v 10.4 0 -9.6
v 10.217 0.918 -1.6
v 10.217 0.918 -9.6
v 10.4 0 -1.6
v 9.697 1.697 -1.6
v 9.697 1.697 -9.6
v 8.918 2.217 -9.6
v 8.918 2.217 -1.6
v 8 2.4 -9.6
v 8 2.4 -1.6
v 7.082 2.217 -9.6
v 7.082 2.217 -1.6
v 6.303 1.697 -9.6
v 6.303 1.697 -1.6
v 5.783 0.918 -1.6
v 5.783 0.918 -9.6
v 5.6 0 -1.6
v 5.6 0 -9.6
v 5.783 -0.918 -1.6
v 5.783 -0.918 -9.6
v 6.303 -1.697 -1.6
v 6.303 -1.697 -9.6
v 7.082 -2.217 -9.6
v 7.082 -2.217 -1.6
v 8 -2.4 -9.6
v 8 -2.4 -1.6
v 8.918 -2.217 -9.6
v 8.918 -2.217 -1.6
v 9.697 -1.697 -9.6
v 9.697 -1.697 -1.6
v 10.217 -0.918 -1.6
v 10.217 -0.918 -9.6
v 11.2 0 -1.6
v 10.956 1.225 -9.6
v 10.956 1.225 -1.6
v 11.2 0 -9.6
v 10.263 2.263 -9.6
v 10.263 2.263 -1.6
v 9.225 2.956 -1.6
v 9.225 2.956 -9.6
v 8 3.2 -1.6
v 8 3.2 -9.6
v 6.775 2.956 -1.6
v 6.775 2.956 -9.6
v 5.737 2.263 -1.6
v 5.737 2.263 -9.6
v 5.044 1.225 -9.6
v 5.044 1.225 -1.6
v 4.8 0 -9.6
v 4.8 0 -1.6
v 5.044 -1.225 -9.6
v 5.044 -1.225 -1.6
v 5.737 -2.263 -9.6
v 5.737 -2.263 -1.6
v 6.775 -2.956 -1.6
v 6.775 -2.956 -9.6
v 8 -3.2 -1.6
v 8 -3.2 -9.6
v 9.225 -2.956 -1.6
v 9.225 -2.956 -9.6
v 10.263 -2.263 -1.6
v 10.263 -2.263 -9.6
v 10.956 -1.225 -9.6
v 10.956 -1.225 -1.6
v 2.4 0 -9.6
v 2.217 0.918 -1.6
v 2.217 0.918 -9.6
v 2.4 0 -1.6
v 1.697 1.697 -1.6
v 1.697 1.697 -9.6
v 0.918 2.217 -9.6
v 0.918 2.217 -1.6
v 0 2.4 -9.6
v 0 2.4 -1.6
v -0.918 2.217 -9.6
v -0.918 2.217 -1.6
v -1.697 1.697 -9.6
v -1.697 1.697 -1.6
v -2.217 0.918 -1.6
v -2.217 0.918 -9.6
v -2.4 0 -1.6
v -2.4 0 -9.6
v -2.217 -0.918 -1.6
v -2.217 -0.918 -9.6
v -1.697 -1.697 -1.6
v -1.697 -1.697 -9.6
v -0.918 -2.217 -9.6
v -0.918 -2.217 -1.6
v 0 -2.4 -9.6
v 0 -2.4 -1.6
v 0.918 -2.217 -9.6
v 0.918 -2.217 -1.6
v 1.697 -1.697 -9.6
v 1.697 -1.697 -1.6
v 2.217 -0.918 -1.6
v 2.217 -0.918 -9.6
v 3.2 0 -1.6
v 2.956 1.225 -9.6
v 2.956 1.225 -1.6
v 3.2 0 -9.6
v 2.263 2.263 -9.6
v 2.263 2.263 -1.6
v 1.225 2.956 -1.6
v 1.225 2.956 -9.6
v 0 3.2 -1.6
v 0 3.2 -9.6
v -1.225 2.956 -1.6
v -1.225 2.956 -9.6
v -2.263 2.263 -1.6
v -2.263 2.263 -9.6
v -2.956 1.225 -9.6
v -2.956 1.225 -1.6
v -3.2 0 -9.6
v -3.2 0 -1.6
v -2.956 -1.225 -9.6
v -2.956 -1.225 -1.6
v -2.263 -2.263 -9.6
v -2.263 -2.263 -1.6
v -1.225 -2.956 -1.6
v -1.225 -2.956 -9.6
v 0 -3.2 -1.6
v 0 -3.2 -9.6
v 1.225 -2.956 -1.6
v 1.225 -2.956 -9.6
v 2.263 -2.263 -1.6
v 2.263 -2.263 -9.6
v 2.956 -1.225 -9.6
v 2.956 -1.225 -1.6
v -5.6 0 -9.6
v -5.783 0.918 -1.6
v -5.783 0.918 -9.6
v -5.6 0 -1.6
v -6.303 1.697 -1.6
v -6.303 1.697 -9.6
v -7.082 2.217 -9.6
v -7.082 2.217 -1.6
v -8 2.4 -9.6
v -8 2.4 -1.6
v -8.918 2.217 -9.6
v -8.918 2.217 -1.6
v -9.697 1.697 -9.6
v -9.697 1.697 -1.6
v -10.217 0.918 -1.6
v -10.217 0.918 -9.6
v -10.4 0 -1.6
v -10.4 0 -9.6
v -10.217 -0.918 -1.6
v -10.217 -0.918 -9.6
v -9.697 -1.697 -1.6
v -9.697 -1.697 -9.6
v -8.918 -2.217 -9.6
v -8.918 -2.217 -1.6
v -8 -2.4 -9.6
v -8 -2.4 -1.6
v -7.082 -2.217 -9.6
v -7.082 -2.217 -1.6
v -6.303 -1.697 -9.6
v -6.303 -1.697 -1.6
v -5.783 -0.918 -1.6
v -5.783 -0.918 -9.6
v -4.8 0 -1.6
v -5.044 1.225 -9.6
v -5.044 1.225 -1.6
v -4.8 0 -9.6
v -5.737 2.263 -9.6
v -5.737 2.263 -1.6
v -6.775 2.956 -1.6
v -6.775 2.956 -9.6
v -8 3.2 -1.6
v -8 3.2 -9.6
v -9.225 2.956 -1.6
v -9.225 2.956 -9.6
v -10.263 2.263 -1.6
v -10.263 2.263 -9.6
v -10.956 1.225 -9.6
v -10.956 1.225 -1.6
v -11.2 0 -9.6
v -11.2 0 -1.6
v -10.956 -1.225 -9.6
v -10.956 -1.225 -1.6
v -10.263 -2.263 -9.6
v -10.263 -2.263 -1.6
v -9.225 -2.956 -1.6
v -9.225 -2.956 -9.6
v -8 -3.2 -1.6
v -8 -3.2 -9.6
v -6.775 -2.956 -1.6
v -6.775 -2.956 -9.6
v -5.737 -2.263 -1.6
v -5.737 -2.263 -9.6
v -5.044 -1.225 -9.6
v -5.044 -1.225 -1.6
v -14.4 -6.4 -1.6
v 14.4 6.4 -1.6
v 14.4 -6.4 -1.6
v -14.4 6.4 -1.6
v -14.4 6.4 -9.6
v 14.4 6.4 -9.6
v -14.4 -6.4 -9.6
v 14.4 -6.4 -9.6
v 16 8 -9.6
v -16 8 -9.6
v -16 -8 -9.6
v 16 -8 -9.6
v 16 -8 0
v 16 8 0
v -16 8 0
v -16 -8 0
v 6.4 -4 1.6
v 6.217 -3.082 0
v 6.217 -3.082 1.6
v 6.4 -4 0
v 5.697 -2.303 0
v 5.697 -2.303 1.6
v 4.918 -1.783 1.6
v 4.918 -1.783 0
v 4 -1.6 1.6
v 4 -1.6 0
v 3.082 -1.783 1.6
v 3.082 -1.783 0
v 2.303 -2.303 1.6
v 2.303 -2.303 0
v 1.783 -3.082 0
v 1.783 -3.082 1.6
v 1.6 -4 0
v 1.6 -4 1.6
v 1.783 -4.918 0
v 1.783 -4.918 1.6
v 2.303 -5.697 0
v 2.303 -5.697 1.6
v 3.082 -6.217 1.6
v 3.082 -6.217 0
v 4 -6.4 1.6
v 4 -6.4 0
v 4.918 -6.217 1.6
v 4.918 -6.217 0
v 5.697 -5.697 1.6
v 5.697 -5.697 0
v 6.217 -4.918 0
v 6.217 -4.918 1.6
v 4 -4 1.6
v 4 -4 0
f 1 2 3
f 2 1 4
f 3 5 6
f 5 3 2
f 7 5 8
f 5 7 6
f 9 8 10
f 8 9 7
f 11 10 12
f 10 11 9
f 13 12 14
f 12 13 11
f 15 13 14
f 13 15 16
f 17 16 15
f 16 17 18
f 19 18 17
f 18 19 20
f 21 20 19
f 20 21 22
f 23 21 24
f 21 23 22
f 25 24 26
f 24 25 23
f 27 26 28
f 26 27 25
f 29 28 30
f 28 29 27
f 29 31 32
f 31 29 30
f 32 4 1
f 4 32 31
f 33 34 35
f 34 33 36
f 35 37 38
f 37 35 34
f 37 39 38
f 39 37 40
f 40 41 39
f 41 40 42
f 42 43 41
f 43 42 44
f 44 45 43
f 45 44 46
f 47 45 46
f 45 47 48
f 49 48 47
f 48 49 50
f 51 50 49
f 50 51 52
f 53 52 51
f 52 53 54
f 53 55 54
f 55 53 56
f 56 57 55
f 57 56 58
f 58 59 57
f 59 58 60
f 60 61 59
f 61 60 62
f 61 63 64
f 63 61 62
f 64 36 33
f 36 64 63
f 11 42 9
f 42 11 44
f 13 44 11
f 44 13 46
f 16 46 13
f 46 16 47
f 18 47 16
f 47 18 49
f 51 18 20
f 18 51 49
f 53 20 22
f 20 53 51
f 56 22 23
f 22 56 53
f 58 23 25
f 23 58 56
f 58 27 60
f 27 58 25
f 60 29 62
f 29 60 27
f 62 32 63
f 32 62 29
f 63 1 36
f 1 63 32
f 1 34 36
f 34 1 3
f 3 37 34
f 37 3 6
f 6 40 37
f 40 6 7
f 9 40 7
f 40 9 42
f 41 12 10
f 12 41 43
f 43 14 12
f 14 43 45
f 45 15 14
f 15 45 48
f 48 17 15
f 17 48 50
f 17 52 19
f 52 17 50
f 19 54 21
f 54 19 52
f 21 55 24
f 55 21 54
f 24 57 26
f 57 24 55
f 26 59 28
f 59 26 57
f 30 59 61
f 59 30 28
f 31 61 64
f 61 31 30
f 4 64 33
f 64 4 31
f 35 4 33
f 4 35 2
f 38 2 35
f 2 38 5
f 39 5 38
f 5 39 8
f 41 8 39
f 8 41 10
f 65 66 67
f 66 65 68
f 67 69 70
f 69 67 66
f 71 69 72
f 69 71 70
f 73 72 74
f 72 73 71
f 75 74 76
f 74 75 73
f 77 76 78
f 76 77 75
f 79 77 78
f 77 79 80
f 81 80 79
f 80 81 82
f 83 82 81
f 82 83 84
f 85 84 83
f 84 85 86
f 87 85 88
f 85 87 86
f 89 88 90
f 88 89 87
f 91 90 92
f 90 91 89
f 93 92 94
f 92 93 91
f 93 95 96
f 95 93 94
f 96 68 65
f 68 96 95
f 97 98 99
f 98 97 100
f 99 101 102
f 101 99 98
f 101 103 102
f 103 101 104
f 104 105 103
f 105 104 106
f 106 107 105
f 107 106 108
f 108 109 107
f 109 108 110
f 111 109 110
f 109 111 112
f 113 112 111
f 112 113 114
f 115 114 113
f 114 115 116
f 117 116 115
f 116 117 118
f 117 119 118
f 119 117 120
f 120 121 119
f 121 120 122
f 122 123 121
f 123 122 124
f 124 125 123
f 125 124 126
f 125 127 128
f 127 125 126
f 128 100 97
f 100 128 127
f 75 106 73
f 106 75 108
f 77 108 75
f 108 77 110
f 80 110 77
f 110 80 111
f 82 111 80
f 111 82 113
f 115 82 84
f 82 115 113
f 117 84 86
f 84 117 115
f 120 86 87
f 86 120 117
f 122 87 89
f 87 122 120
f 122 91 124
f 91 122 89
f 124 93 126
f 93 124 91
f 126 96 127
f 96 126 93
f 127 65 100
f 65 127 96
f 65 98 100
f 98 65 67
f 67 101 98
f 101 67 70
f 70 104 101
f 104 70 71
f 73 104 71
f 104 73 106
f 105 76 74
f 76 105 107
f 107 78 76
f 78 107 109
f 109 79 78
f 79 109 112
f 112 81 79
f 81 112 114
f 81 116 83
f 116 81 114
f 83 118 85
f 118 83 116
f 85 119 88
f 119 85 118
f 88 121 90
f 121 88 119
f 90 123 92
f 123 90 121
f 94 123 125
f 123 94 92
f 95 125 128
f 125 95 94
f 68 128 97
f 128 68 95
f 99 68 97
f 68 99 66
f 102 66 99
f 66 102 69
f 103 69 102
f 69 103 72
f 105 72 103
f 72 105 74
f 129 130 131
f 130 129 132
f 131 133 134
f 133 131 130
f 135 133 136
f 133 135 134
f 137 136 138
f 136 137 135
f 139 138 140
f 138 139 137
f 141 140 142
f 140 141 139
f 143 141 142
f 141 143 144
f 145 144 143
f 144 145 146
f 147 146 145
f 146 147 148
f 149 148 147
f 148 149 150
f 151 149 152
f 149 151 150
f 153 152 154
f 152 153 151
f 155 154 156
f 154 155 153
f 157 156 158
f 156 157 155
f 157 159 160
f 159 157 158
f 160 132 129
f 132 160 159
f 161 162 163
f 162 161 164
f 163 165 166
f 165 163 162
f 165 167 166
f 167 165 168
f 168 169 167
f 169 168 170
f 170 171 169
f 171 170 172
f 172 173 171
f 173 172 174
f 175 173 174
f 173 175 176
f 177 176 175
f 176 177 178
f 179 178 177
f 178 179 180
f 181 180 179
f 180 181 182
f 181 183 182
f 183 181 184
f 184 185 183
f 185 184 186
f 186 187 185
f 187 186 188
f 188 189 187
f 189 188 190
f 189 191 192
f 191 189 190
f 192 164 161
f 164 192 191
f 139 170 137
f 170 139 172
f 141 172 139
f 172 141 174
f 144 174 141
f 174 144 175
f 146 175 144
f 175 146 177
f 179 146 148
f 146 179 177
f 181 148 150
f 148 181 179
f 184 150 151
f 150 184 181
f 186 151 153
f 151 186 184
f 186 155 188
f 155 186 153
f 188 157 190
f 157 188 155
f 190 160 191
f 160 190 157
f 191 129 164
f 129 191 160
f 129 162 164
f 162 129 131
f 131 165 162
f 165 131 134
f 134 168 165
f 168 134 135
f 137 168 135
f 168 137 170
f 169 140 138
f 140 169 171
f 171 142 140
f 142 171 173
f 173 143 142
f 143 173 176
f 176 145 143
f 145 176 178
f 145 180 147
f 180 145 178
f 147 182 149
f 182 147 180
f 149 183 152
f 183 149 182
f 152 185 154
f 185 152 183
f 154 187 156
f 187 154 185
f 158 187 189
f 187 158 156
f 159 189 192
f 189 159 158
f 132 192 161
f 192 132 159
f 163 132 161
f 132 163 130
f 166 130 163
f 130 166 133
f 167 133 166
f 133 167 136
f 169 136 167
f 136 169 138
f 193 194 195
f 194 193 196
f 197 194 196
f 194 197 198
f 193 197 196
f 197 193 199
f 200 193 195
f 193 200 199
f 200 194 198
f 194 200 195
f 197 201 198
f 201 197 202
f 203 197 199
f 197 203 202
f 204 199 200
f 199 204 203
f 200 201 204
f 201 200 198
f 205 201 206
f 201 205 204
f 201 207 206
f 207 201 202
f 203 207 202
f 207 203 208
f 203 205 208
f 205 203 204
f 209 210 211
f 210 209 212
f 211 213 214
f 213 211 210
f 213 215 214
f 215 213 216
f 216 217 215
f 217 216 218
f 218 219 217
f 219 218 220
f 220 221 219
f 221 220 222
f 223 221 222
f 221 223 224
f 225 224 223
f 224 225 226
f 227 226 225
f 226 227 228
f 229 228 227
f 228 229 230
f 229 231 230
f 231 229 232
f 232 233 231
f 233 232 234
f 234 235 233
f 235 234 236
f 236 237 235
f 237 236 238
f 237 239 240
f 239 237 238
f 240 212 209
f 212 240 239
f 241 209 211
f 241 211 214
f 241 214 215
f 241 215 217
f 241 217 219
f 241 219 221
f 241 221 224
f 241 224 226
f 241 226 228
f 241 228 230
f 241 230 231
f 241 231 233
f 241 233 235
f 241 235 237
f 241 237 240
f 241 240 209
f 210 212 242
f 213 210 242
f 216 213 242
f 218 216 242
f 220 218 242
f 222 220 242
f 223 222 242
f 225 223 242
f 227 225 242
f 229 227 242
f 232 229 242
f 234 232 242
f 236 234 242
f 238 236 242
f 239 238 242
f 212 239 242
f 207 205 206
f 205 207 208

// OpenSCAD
// file: ../p/4-4ring3.scad
use <../lib.scad>
$fa=1; $fs=0.2;
function ldraw_lib__4_4ring3(realsolid=false) = [
// 0 Ring  3 x 1.0
// 0 Name: 4-4ring3.dat
// 0 Author: James Jessiman
// 0 !LDRAW_ORG Primitive UPDATE 2009-01
// 0 !LICENSE Licensed under CC BY 2.0 and CC BY 4.0 : see CAreadme.txt
// 
// 0 BFC CERTIFY CCW
  [0,"BFC","CERTIFY"],
  [0,"BFC","CCW"],
// 
// 0 !HISTORY 1998-12-15 [PTadmin] Official Update 1998-10
// 0 !HISTORY 2002-04-05 [hafhead] Added BFC statement
// 0 !HISTORY 2002-04-25 [PTadmin] Official Update 2002-02
// 0 !HISTORY 2007-06-24 [PTadmin] Header formatted for Contributor Agreement
// 0 !HISTORY 2008-07-01 [PTadmin] Official Update 2008-01
// 0 !HISTORY 2008-08-26 [cwdee] Switch polygon winding and rename
// 0 !HISTORY 2009-05-02 [PTadmin] Official Update 2009-01
// 
// 
// 4 16 -1.5308 0 3.6956 -1.1481 0 2.7717 0 0 3 0 0 4
  [4,16,-1.5308,0,3.6956,-1.1481,0,2.7717,0,0,3,0,0,4],
// 4 16 -2.8284 0 2.8284 -2.1213 0 2.1213 -1.1481 0 2.7717 -1.5308 0 3.6956
  [4,16,-2.8284,0,2.8284,-2.1213,0,2.1213,-1.1481,0,2.7717,-1.5308,0,3.6956],
// 4 16 -3.6956 0 1.5308 -2.7717 0 1.1481 -2.1213 0 2.1213 -2.8284 0 2.8284
  [4,16,-3.6956,0,1.5308,-2.7717,0,1.1481,-2.1213,0,2.1213,-2.8284,0,2.8284],
// 4 16 -4 0 0 -3 0 0 -2.7717 0 1.1481 -3.6956 0 1.5308
  [4,16,-4,0,0,-3,0,0,-2.7717,0,1.1481,-3.6956,0,1.5308],
// 4 16 -3.6956 0 -1.5308 -2.7717 0 -1.1481 -3 0 0 -4 0 0
  [4,16,-3.6956,0,-1.5308,-2.7717,0,-1.1481,-3,0,0,-4,0,0],
// 4 16 -2.8284 0 -2.8284 -2.1213 0 -2.1213 -2.7717 0 -1.1481 -3.6956 0 -1.5308
  [4,16,-2.8284,0,-2.8284,-2.1213,0,-2.1213,-2.7717,0,-1.1481,-3.6956,0,-1.5308],
// 4 16 -1.5308 0 -3.6956 -1.1481 0 -2.7717 -2.1213 0 -2.1213 -2.8284 0 -2.8284
  [4,16,-1.5308,0,-3.6956,-1.1481,0,-2.7717,-2.1213,0,-2.1213,-2.8284,0,-2.8284],
// 4 16 0 0 -4 0 0 -3 -1.1481 0 -2.7717 -1.5308 0 -3.6956
  [4,16,0,0,-4,0,0,-3,-1.1481,0,-2.7717,-1.5308,0,-3.6956],
// 4 16 1.5308 0 -3.6956 1.1481 0 -2.7717 0 0 -3 0 0 -4
  [4,16,1.5308,0,-3.6956,1.1481,0,-2.7717,0,0,-3,0,0,-4],
// 4 16 2.8284 0 -2.8284 2.1213 0 -2.1213 1.1481 0 -2.7717 1.5308 0 -3.6956
  [4,16,2.8284,0,-2.8284,2.1213,0,-2.1213,1.1481,0,-2.7717,1.5308,0,-3.6956],
// 4 16 3.6956 0 -1.5308 2.7717 0 -1.1481 2.1213 0 -2.1213 2.8284 0 -2.8284
  [4,16,3.6956,0,-1.5308,2.7717,0,-1.1481,2.1213,0,-2.1213,2.8284,0,-2.8284],
// 4 16 4 0 0 3 0 0 2.7717 0 -1.1481 3.6956 0 -1.5308
  [4,16,4,0,0,3,0,0,2.7717,0,-1.1481,3.6956,0,-1.5308],
// 4 16 3.6956 0 1.5308 2.7717 0 1.1481 3 0 0 4 0 0
  [4,16,3.6956,0,1.5308,2.7717,0,1.1481,3,0,0,4,0,0],
// 4 16 2.8284 0 2.8284 2.1213 0 2.1213 2.7717 0 1.1481 3.6956 0 1.5308
  [4,16,2.8284,0,2.8284,2.1213,0,2.1213,2.7717,0,1.1481,3.6956,0,1.5308],
// 4 16 1.5308 0 3.6956 1.1481 0 2.7717 2.1213 0 2.1213 2.8284 0 2.8284
  [4,16,1.5308,0,3.6956,1.1481,0,2.7717,2.1213,0,2.1213,2.8284,0,2.8284],
// 4 16 0 0 4 0 0 3 1.1481 0 2.7717 1.5308 0 3.6956
  [4,16,0,0,4,0,0,3,1.1481,0,2.7717,1.5308,0,3.6956],
// 0
];
module ldraw_lib__4_4ring3(step=0, col=false, unit=2/5, alt=false, line=0.2, solid=!$preview)
    makepoly(ldraw_lib__4_4ring3(solid), step=step, col=col, unit=unit, alt=alt, line=line, solid=solid);
ldraw_lib__4_4ring3(line=0.2);
// file: ../p/4-4edge.scad
use <../lib.scad>
function ldraw_lib__4_4edge() = [
// 0 Circle 1.0
// 0 Name: 4-4edge.dat
// 0 Author: James Jessiman
// 0 !LDRAW_ORG Primitive UPDATE 2017-01
// 0 !LICENSE Licensed under CC BY 2.0 and CC BY 4.0 : see CAreadme.txt
// 
// 0 BFC CERTIFY CCW
  [0,"BFC","CERTIFY"],
  [0,"BFC","CCW"],
// 
// 0 !HISTORY 1998-12-15 [PTadmin] Official Update 1998-10
// 0 !HISTORY 2005-12-28 [PTadmin] Official Update 2005-01
// 0 !HISTORY 2007-06-24 [PTadmin] Header formatted for Contributor Agreement
// 0 !HISTORY 2008-07-01 [PTadmin] Official Update 2008-01
// 0 !HISTORY 2017-01-15 [Steffen] BFCed
// 0 !HISTORY 2017-12-30 [PTadmin] Official Update 2017-01
// 
// 
// 2 24 1 0 0 0.9239 0 0.3827
  [2,24,1,0,0,0.9239,0,0.3827],
// 2 24 0.9239 0 0.3827 0.7071 0 0.7071
  [2,24,0.9239,0,0.3827,0.7071,0,0.7071],
// 2 24 0.7071 0 0.7071 0.3827 0 0.9239
  [2,24,0.7071,0,0.7071,0.3827,0,0.9239],
// 2 24 0.3827 0 0.9239 0 0 1
  [2,24,0.3827,0,0.9239,0,0,1],
// 2 24 0 0 1 -0.3827 0 0.9239
  [2,24,0,0,1,-0.3827,0,0.9239],
// 2 24 -0.3827 0 0.9239 -0.7071 0 0.7071
  [2,24,-0.3827,0,0.9239,-0.7071,0,0.7071],
// 2 24 -0.7071 0 0.7071 -0.9239 0 0.3827
  [2,24,-0.7071,0,0.7071,-0.9239,0,0.3827],
// 2 24 -0.9239 0 0.3827 -1 0 -0
  [2,24,-0.9239,0,0.3827,-1,0,-0],
// 2 24 -1 0 -0 -0.9239 0 -0.3827
  [2,24,-1,0,-0,-0.9239,0,-0.3827],
// 2 24 -0.9239 0 -0.3827 -0.7071 0 -0.7071
  [2,24,-0.9239,0,-0.3827,-0.7071,0,-0.7071],
// 2 24 -0.7071 0 -0.7071 -0.3827 0 -0.9239
  [2,24,-0.7071,0,-0.7071,-0.3827,0,-0.9239],
// 2 24 -0.3827 0 -0.9239 0 0 -1
  [2,24,-0.3827,0,-0.9239,0,0,-1],
// 2 24 0 0 -1 0.3827 0 -0.9239
  [2,24,0,0,-1,0.3827,0,-0.9239],
// 2 24 0.3827 0 -0.9239 0.7071 0 -0.7071
  [2,24,0.3827,0,-0.9239,0.7071,0,-0.7071],
// 2 24 0.7071 0 -0.7071 0.9239 0 -0.3827
  [2,24,0.7071,0,-0.7071,0.9239,0,-0.3827],
// 2 24 0.9239 0 -0.3827 1 0 0
  [2,24,0.9239,0,-0.3827,1,0,0],
];
module ldraw_lib__4_4edge(step=0, col=false, unit=2/5, alt=false, line=0.2, solid=!$preview)
    makepoly(ldraw_lib__4_4edge(), step=step, col=col, unit=unit, alt=alt, line=line, solid=solid);
ldraw_lib__4_4edge(line=0.2);
// file: ../p/4-4disc.scad
use <../lib.scad>
function ldraw_lib__4_4disc() = [
// 0 Disc 1.0
// 0 Name: 4-4disc.dat
// 0 Author: James Jessiman
// 0 !LDRAW_ORG Primitive UPDATE 2002-02
// 0 !LICENSE Licensed under CC BY 2.0 and CC BY 4.0 : see CAreadme.txt
// 
// 0 BFC CERTIFY CCW
  [0,"BFC","CERTIFY"],
  [0,"BFC","CCW"],
// 
// 0 !HISTORY 1998-12-15 [PTadmin] Official Update 1998-10
// 0 !HISTORY 2002-03-23 [sbliss] Added BFC statement
// 0 !HISTORY 2002-04-25 [PTadmin] Official Update 2002-02
// 0 !HISTORY 2007-06-24 [PTadmin] Header formatted for Contributor Agreement
// 0 !HISTORY 2008-07-01 [PTadmin] Official Update 2008-01
// 
// 
// 3 16 0 0 0 1 0 0 0.9239 0 0.3827
  [3,16,0,0,0,1,0,0,0.9239,0,0.3827],
// 3 16 0 0 0 0.9239 0 0.3827 0.7071 0 0.7071
  [3,16,0,0,0,0.9239,0,0.3827,0.7071,0,0.7071],
// 3 16 0 0 0 0.7071 0 0.7071 0.3827 0 0.9239
  [3,16,0,0,0,0.7071,0,0.7071,0.3827,0,0.9239],
// 3 16 0 0 0 0.3827 0 0.9239 0 0 1
  [3,16,0,0,0,0.3827,0,0.9239,0,0,1],
// 3 16 0 0 0 0 0 1 -0.3827 0 0.9239
  [3,16,0,0,0,0,0,1,-0.3827,0,0.9239],
// 3 16 0 0 0 -0.3827 0 0.9239 -0.7071 0 0.7071
  [3,16,0,0,0,-0.3827,0,0.9239,-0.7071,0,0.7071],
// 3 16 0 0 0 -0.7071 0 0.7071 -0.9239 0 0.3827
  [3,16,0,0,0,-0.7071,0,0.7071,-0.9239,0,0.3827],
// 3 16 0 0 0 -0.9239 0 0.3827 -1 0 -0
  [3,16,0,0,0,-0.9239,0,0.3827,-1,0,-0],
// 3 16 0 0 0 -1 0 -0 -0.9239 0 -0.3827
  [3,16,0,0,0,-1,0,-0,-0.9239,0,-0.3827],
// 3 16 0 0 0 -0.9239 0 -0.3827 -0.7071 0 -0.7071
  [3,16,0,0,0,-0.9239,0,-0.3827,-0.7071,0,-0.7071],
// 3 16 0 0 0 -0.7071 0 -0.7071 -0.3827 0 -0.9239
  [3,16,0,0,0,-0.7071,0,-0.7071,-0.3827,0,-0.9239],
// 3 16 0 0 0 -0.3827 0 -0.9239 0 0 -1
  [3,16,0,0,0,-0.3827,0,-0.9239,0,0,-1],
// 3 16 0 0 0 0 0 -1 0.3827 0 -0.9239
  [3,16,0,0,0,0,0,-1,0.3827,0,-0.9239],
// 3 16 0 0 0 0.3827 0 -0.9239 0.7071 0 -0.7071
  [3,16,0,0,0,0.3827,0,-0.9239,0.7071,0,-0.7071],
// 3 16 0 0 0 0.7071 0 -0.7071 0.9239 0 -0.3827
  [3,16,0,0,0,0.7071,0,-0.7071,0.9239,0,-0.3827],
// 3 16 0 0 0 0.9239 0 -0.3827 1 0 0
  [3,16,0,0,0,0.9239,0,-0.3827,1,0,0],
// 0
];
module ldraw_lib__4_4disc(step=0, col=false, unit=2/5, alt=false, line=0.2, solid=!$preview)
    makepoly(ldraw_lib__4_4disc(), step=step, col=col, unit=unit, alt=alt, line=line, solid=solid);
ldraw_lib__4_4disc(line=0.2);
// file: ../p/4-4cyli.scad
use <../lib.scad>
$fa=1; $fs=0.2;
function ldraw_lib__4_4cyli(realsolid=false) = [
// 0 Cylinder 1.0
// 0 Name: 4-4cyli.dat
// 0 Author: James Jessiman
// 0 !LDRAW_ORG Primitive UPDATE 2005-01
// 0 !LICENSE Licensed under CC BY 2.0 and CC BY 4.0 : see CAreadme.txt
// 
// 0 BFC CERTIFY CCW
  [0,"BFC","CERTIFY"],
  [0,"BFC","CCW"],
// 
// 0 !HISTORY 1998-12-15 [PTadmin] Official Update 1998-10
// 0 !HISTORY 2002-03-23 [sbliss] Added BFC statement; merged headers from files in distributions LDraw 0.27 and Complete.
// 0 !HISTORY 2002-04-25 [PTadmin] Official Update 2002-02
// 0 !HISTORY 2004-12-14 [guyvivan] BFC CCW
// 0 !HISTORY 2005-12-28 [PTadmin] Official Update 2005-01
// 0 !HISTORY 2007-06-24 [PTadmin] Header formatted for Contributor Agreement
// 0 !HISTORY 2008-07-01 [PTadmin] Official Update 2008-01
// 
// 
// 4 16 1 1 0 0.9239 1 0.3827 0.9239 0 0.3827 1 0 0
  [4,16,1,1,0,0.9239,1,0.3827,0.9239,0,0.3827,1,0,0],
// 5 24 1 0 0 1 1 0 0.9239 0 0.3827 0.9239 0 -0.3827
  [5,24,1,0,0,1,1,0,0.9239,0,0.3827,0.9239,0,-0.3827],
// 4 16 0.9239 1 0.3827 0.7071 1 0.7071 0.7071 0 0.7071 0.9239 0 0.3827
  [4,16,0.9239,1,0.3827,0.7071,1,0.7071,0.7071,0,0.7071,0.9239,0,0.3827],
// 5 24 0.9239 0 0.3827 0.9239 1 0.3827 0.7071 0 0.7071 1 0 0
  [5,24,0.9239,0,0.3827,0.9239,1,0.3827,0.7071,0,0.7071,1,0,0],
// 4 16 0.7071 1 0.7071 0.3827 1 0.9239 0.3827 0 0.9239 0.7071 0 0.7071
  [4,16,0.7071,1,0.7071,0.3827,1,0.9239,0.3827,0,0.9239,0.7071,0,0.7071],
// 5 24 0.7071 0 0.7071 0.7071 1 0.7071 0.3827 0 0.9239 0.9239 0 0.3827
  [5,24,0.7071,0,0.7071,0.7071,1,0.7071,0.3827,0,0.9239,0.9239,0,0.3827],
// 4 16 0.3827 1 0.9239 0 1 1 0 0 1 0.3827 0 0.9239
  [4,16,0.3827,1,0.9239,0,1,1,0,0,1,0.3827,0,0.9239],
// 5 24 0.3827 0 0.9239 0.3827 1 0.9239 0 0 1 0.7071 0 0.7071
  [5,24,0.3827,0,0.9239,0.3827,1,0.9239,0,0,1,0.7071,0,0.7071],
// 4 16 0 1 1 -0.3827 1 0.9239 -0.3827 0 0.9239 0 0 1
  [4,16,0,1,1,-0.3827,1,0.9239,-0.3827,0,0.9239,0,0,1],
// 5 24 0 0 1 0 1 1 -0.3827 0 0.9239 0.3827 0 0.9239
  [5,24,0,0,1,0,1,1,-0.3827,0,0.9239,0.3827,0,0.9239],
// 4 16 -0.3827 1 0.9239 -0.7071 1 0.7071 -0.7071 0 0.7071 -0.3827 0 0.9239
  [4,16,-0.3827,1,0.9239,-0.7071,1,0.7071,-0.7071,0,0.7071,-0.3827,0,0.9239],
// 5 24 -0.3827 0 0.9239 -0.3827 1 0.9239 -0.7071 0 0.7071 0 0 1
  [5,24,-0.3827,0,0.9239,-0.3827,1,0.9239,-0.7071,0,0.7071,0,0,1],
// 4 16 -0.7071 1 0.7071 -0.9239 1 0.3827 -0.9239 0 0.3827 -0.7071 0 0.7071
  [4,16,-0.7071,1,0.7071,-0.9239,1,0.3827,-0.9239,0,0.3827,-0.7071,0,0.7071],
// 5 24 -0.7071 0 0.7071 -0.7071 1 0.7071 -0.9239 0 0.3827 -0.3827 0 0.9239
  [5,24,-0.7071,0,0.7071,-0.7071,1,0.7071,-0.9239,0,0.3827,-0.3827,0,0.9239],
// 4 16 -0.9239 1 0.3827 -1 1 0 -1 0 0 -0.9239 0 0.3827
  [4,16,-0.9239,1,0.3827,-1,1,0,-1,0,0,-0.9239,0,0.3827],
// 5 24 -0.9239 0 0.3827 -0.9239 1 0.3827 -1 0 0 -0.7071 0 0.7071
  [5,24,-0.9239,0,0.3827,-0.9239,1,0.3827,-1,0,0,-0.7071,0,0.7071],
// 4 16 -1 1 0 -0.9239 1 -0.3827 -0.9239 0 -0.3827 -1 0 0
  [4,16,-1,1,0,-0.9239,1,-0.3827,-0.9239,0,-0.3827,-1,0,0],
// 5 24 -1 0 0 -1 1 0 -0.9239 0 -0.3827 -0.9239 0 0.3827
  [5,24,-1,0,0,-1,1,0,-0.9239,0,-0.3827,-0.9239,0,0.3827],
// 4 16 -0.9239 1 -0.3827 -0.7071 1 -0.7071 -0.7071 0 -0.7071 -0.9239 0 -0.3827
  [4,16,-0.9239,1,-0.3827,-0.7071,1,-0.7071,-0.7071,0,-0.7071,-0.9239,0,-0.3827],
// 5 24 -0.9239 0 -0.3827 -0.9239 1 -0.3827 -0.7071 0 -0.7071 -1 0 0
  [5,24,-0.9239,0,-0.3827,-0.9239,1,-0.3827,-0.7071,0,-0.7071,-1,0,0],
// 4 16 -0.7071 1 -0.7071 -0.3827 1 -0.9239 -0.3827 0 -0.9239 -0.7071 0 -0.7071
  [4,16,-0.7071,1,-0.7071,-0.3827,1,-0.9239,-0.3827,0,-0.9239,-0.7071,0,-0.7071],
// 5 24 -0.7071 0 -0.7071 -0.7071 1 -0.7071 -0.3827 0 -0.9239 -0.9239 0 -0.3827
  [5,24,-0.7071,0,-0.7071,-0.7071,1,-0.7071,-0.3827,0,-0.9239,-0.9239,0,-0.3827],
// 4 16 -0.3827 1 -0.9239 0 1 -1 0 0 -1 -0.3827 0 -0.9239
  [4,16,-0.3827,1,-0.9239,0,1,-1,0,0,-1,-0.3827,0,-0.9239],
// 5 24 -0.3827 0 -0.9239 -0.3827 1 -0.9239 0 0 -1 -0.7071 0 -0.7071
  [5,24,-0.3827,0,-0.9239,-0.3827,1,-0.9239,0,0,-1,-0.7071,0,-0.7071],
// 4 16 0 1 -1 0.3827 1 -0.9239 0.3827 0 -0.9239 0 0 -1
  [4,16,0,1,-1,0.3827,1,-0.9239,0.3827,0,-0.9239,0,0,-1],
// 5 24 0 0 -1 0 1 -1 0.3827 0 -0.9239 -0.3827 0 -0.9239
  [5,24,0,0,-1,0,1,-1,0.3827,0,-0.9239,-0.3827,0,-0.9239],
// 4 16 0.3827 1 -0.9239 0.7071 1 -0.7071 0.7071 0 -0.7071 0.3827 0 -0.9239
  [4,16,0.3827,1,-0.9239,0.7071,1,-0.7071,0.7071,0,-0.7071,0.3827,0,-0.9239],
// 5 24 0.3827 0 -0.9239 0.3827 1 -0.9239 0.7071 0 -0.7071 0 0 -1
  [5,24,0.3827,0,-0.9239,0.3827,1,-0.9239,0.7071,0,-0.7071,0,0,-1],
// 4 16 0.7071 1 -0.7071 0.9239 1 -0.3827 0.9239 0 -0.3827 0.7071 0 -0.7071
  [4,16,0.7071,1,-0.7071,0.9239,1,-0.3827,0.9239,0,-0.3827,0.7071,0,-0.7071],
// 5 24 0.7071 0 -0.7071 0.7071 1 -0.7071 0.9239 0 -0.3827 0.3827 0 -0.9239
  [5,24,0.7071,0,-0.7071,0.7071,1,-0.7071,0.9239,0,-0.3827,0.3827,0,-0.9239],
// 4 16 0.9239 1 -0.3827 1 1 0 1 0 0 0.9239 0 -0.3827
  [4,16,0.9239,1,-0.3827,1,1,0,1,0,0,0.9239,0,-0.3827],
// 5 24 0.9239 0 -0.3827 0.9239 1 -0.3827 1 0 0 0.7071 0 -0.7071
  [5,24,0.9239,0,-0.3827,0.9239,1,-0.3827,1,0,0,0.7071,0,-0.7071],
// 0
];
module ldraw_lib__4_4cyli(step=0, col=false, unit=2/5, alt=false, line=0.2, solid=!$preview)
    makepoly(ldraw_lib__4_4cyli(solid), step=step, col=col, unit=unit, alt=alt, line=line, solid=solid);
ldraw_lib__4_4cyli(line=0.2);
// file: ../p/stud4.scad
use <../lib.scad>
use <4-4cyli.scad>
use <4-4edge.scad>
use <4-4ring3.scad>
function ldraw_lib__stud4() = [
// 0 Stud Tube Open
// 0 Name: stud4.dat
// 0 Author: James Jessiman
// 0 !LDRAW_ORG Primitive UPDATE 2009-02
// 0 !LICENSE Licensed under CC BY 4.0 : see CAreadme.txt
// 
// 0 BFC CERTIFY CCW
  [0,"BFC","CERTIFY"],
  [0,"BFC","CCW"],
// 
// 0 !HISTORY 1999-07-05 [PTadmin] Official Update 1999-05
// 0 !HISTORY 2002-04-04 [sbliss] Modified for BFC compliance
// 0 !HISTORY 2002-04-25 [PTadmin] Official Update 2002-02
// 0 !HISTORY 2007-06-24 [PTadmin] Header formatted for Contributor Agreement
// 0 !HISTORY 2008-07-01 [PTadmin] Official Update 2008-01
// 0 !HISTORY 2009-06-21 [cwdee] Update ring references to 4-4ring
// 0 !HISTORY 2009-09-03 [PTadmin] Official Update 2009-02
// 
// 
// 1 16 0 -4 0 6 0 0 0 1 0 0 0 6 4-4edge.dat
  [1,16,0,-4,0,6,0,0,0,1,0,0,0,6, ldraw_lib__4_4edge()],
// 1 16 0 -4 0 8 0 0 0 1 0 0 0 8 4-4edge.dat
  [1,16,0,-4,0,8,0,0,0,1,0,0,0,8, ldraw_lib__4_4edge()],
// 1 16 0 0 0 6 0 0 0 1 0 0 0 6 4-4edge.dat
  [1,16,0,0,0,6,0,0,0,1,0,0,0,6, ldraw_lib__4_4edge()],
// 1 16 0 0 0 8 0 0 0 1 0 0 0 8 4-4edge.dat
  [1,16,0,0,0,8,0,0,0,1,0,0,0,8, ldraw_lib__4_4edge()],
// 0 BFC INVERTNEXT
  [0,"BFC","INVERTNEXT"],
// 1 16 0 -4 0 6 0 0 0 4 0 0 0 6 4-4cyli.dat
  [1,16,0,-4,0,6,0,0,0,4,0,0,0,6, ldraw_lib__4_4cyli()],
// 1 16 0 -4 0 8 0 0 0 4 0 0 0 8 4-4cyli.dat
  [1,16,0,-4,0,8,0,0,0,4,0,0,0,8, ldraw_lib__4_4cyli()],
// 1 16 0 -4 0 2 0 0 0 1 0 0 0 2 4-4ring3.dat
  [1,16,0,-4,0,2,0,0,0,1,0,0,0,2, ldraw_lib__4_4ring3()],
  [-1,16,0,0,0,2,0,0,0,-1,0,0,0,2, ldraw_lib__4_4ring3()],
// 0
];
module ldraw_lib__stud4(step=0, col=false, unit=2/5, alt=false, line=0.2, solid=!$preview)
    makepoly(ldraw_lib__stud4(), step=step, col=col, unit=unit, alt=alt, line=line, solid=solid);
ldraw_lib__stud4(line=0.2);
// file: ../p/box5.scad
use <../lib.scad>
function ldraw_lib__box5() = [
// 0 Box with 5 Faces and All Edges
// 0 Name: box5.dat
// 0 Author: James Jessiman
// 0 !LDRAW_ORG Primitive UPDATE 2012-01
// 0 !LICENSE Licensed under CC BY 2.0 and CC BY 4.0 : see CAreadme.txt
// 
// 0 BFC CERTIFY CCW
  [0,"BFC","CERTIFY"],
  [0,"BFC","CCW"],
// 
// 0 !HISTORY 2002-04-03 [sbliss] Modified for BFC compliance
// 0 !HISTORY 2002-04-25 [PTadmin] Official Update 2002-02
// 0 !HISTORY 2007-06-24 [PTadmin] Header formatted for Contributor Agreement
// 0 !HISTORY 2008-07-01 [PTadmin] Official Update 2008-01
// 0 !HISTORY 2012-02-16 [Philo] Changed to CCW
// 0 !HISTORY 2012-03-30 [PTadmin] Official Update 2012-01
// 
// 
// 2 24 1 1 1 -1 1 1
  [2,24,1,1,1,-1,1,1],
// 2 24 -1 1 1 -1 1 -1
  [2,24,-1,1,1,-1,1,-1],
// 2 24 -1 1 -1 1 1 -1
  [2,24,-1,1,-1,1,1,-1],
// 2 24 1 1 -1 1 1 1
  [2,24,1,1,-1,1,1,1],
// 2 24 1 0 1 -1 0 1
  [2,24,1,0,1,-1,0,1],
// 2 24 -1 0 1 -1 0 -1
  [2,24,-1,0,1,-1,0,-1],
// 2 24 -1 0 -1 1 0 -1
  [2,24,-1,0,-1,1,0,-1],
// 2 24 1 0 -1 1 0 1
  [2,24,1,0,-1,1,0,1],
// 2 24 1 0 1 1 1 1
  [2,24,1,0,1,1,1,1],
// 2 24 -1 0 1 -1 1 1
  [2,24,-1,0,1,-1,1,1],
// 2 24 1 0 -1 1 1 -1
  [2,24,1,0,-1,1,1,-1],
// 2 24 -1 0 -1 -1 1 -1
  [2,24,-1,0,-1,-1,1,-1],
// 4 16 -1 1 1 1 1 1 1 1 -1 -1 1 -1
  [4,16,-1,1,1,1,1,1,1,1,-1,-1,1,-1],
// 4 16 -1 1 1 -1 0 1 1 0 1 1 1 1
  [4,16,-1,1,1,-1,0,1,1,0,1,1,1,1],
// 4 16 -1 1 -1 -1 0 -1 -1 0 1 -1 1 1
  [4,16,-1,1,-1,-1,0,-1,-1,0,1,-1,1,1],
// 4 16 1 1 -1 1 0 -1 -1 0 -1 -1 1 -1
  [4,16,1,1,-1,1,0,-1,-1,0,-1,-1,1,-1],
// 4 16 1 1 1 1 0 1 1 0 -1 1 1 -1
  [4,16,1,1,1,1,0,1,1,0,-1,1,1,-1],
];
makepoly(ldraw_lib__box5(), line=0.2);
// file: ../p/box4.scad
use <../lib.scad>
function ldraw_lib__box4() = [
// 0 Box with 4 Faces (2 Parallel Pairs) and All Edges
// 0 Name: box4.dat
// 0 Author: James Jessiman
// 0 !LDRAW_ORG Primitive UPDATE 2012-01
// 0 !LICENSE Licensed under CC BY 4.0 : see CAreadme.txt
// 
// 0 BFC CERTIFY CCW
  [0,"BFC","CERTIFY"],
  [0,"BFC","CCW"],
// 
// 0 !HISTORY 2002-04-03 [sbliss] Modified for BFC compliance
// 0 !HISTORY 2002-04-25 [PTadmin] Official Update 2002-02
// 0 !HISTORY 2007-06-24 [PTadmin] Header formatted for Contributor Agreement
// 0 !HISTORY 2008-07-01 [PTadmin] Official Update 2008-01
// 0 !HISTORY 2012-02-16 [Philo] Changed to CCW
// 0 !HISTORY 2012-03-30 [PTadmin] Official Update 2012-01
// 
// 
// 2 24 1 1 1 -1 1 1
  [2,24,1,1,1,-1,1,1],
// 2 24 -1 1 1 -1 1 -1
  [2,24,-1,1,1,-1,1,-1],
// 2 24 -1 1 -1 1 1 -1
  [2,24,-1,1,-1,1,1,-1],
// 2 24 1 1 -1 1 1 1
  [2,24,1,1,-1,1,1,1],
// 2 24 1 0 1 -1 0 1
  [2,24,1,0,1,-1,0,1],
// 2 24 -1 0 1 -1 0 -1
  [2,24,-1,0,1,-1,0,-1],
// 2 24 -1 0 -1 1 0 -1
  [2,24,-1,0,-1,1,0,-1],
// 2 24 1 0 -1 1 0 1
  [2,24,1,0,-1,1,0,1],
// 2 24 1 0 1 1 1 1
  [2,24,1,0,1,1,1,1],
// 2 24 -1 0 1 -1 1 1
  [2,24,-1,0,1,-1,1,1],
// 2 24 1 0 -1 1 1 -1
  [2,24,1,0,-1,1,1,-1],
// 2 24 -1 0 -1 -1 1 -1
  [2,24,-1,0,-1,-1,1,-1],
// 4 16 -1 1 1 -1 0 1 1 0 1 1 1 1
  [4,16,-1,1,1,-1,0,1,1,0,1,1,1,1],
// 4 16 -1 1 -1 -1 0 -1 -1 0 1 -1 1 1
  [4,16,-1,1,-1,-1,0,-1,-1,0,1,-1,1,1],
// 4 16 1 1 -1 1 0 -1 -1 0 -1 -1 1 -1
  [4,16,1,1,-1,1,0,-1,-1,0,-1,-1,1,-1],
// 4 16 1 1 1 1 0 1 1 0 -1 1 1 -1
  [4,16,1,1,1,1,0,1,1,0,-1,1,1,-1],
];
module ldraw_lib__box4(step=0, col=false, unit=2/5, alt=false, line=0.2, solid=!$preview)
    makepoly(ldraw_lib__box4(), step=step, col=col, unit=unit, alt=alt, line=line, solid=solid);
ldraw_lib__box4(line=0.2);
// file: ../p/stud.scad
use <../lib.scad>
use <4-4cyli.scad>
use <4-4disc.scad>
use <4-4edge.scad>
function ldraw_lib__stud() = [
// 0 Stud
// 0 Name: stud.dat
// 0 Author: James Jessiman
// 0 !LDRAW_ORG Primitive UPDATE 2012-01
// 0 !LICENSE Licensed under CC BY 4.0 : see CAreadme.txt
// 
// 0 BFC CERTIFY CCW
  [0,"BFC","CERTIFY"],
  [0,"BFC","CCW"],
// 
// 0 !HISTORY 2002-04-04 [sbliss] Modified for BFC compliance
// 0 !HISTORY 2002-04-25 [PTadmin] Official Update 2002-02
// 0 !HISTORY 2007-06-24 [PTadmin] Header formatted for Contributor Agreement
// 0 !HISTORY 2008-07-01 [PTadmin] Official Update 2008-01
// 0 !HISTORY 2012-02-16 [Philo] Changed to CCW
// 0 !HISTORY 2012-03-30 [PTadmin] Official Update 2012-01
// 
// 
// 1 16 0 0 0 6 0 0 0 1 0 0 0 6 4-4edge.dat
  [1,16,0,0,0,6,0,0,0,1,0,0,0,6, ldraw_lib__4_4edge()],
// 1 16 0 -4 0 6 0 0 0 1 0 0 0 6 4-4edge.dat
  [1,16,0,-4,0,6,0,0,0,1,0,0,0,6, ldraw_lib__4_4edge()],
// 1 16 0 0 0 6 0 0 0 -4 0 0 0 6 4-4cyli.dat
  [1,16,0,0,0,6,0,0,0,-4,0,0,0,6, ldraw_lib__4_4cyli()],
// 1 16 0 -4 0 6 0 0 0 1 0 0 0 6 4-4disc.dat
  [1,16,0,-4,0,6,0,0,0,1,0,0,0,6, ldraw_lib__4_4disc()],
  [-1,16,0,0,0,6,0,0,0,-1,0,0,0,6, ldraw_lib__4_4disc()],
];
module ldraw_lib__stud(step=0, col=false, unit=2/5, alt=false, line=0.2, solid=!$preview)
    makepoly(ldraw_lib__stud(), step=step, col=col, unit=unit, alt=alt, line=line, solid=solid);
ldraw_lib__stud(line=0.2);
// file: s/3001s02.scad
use <../../lib.scad>
use <../../p/box4.scad>
use <../../p/box5.scad>
use <../../p/stud4.scad>
function ldraw_lib__s__3001s02() = [
// 0 ~Brick  2 x  4 without Top and Top Studs
// 0 Name: s\3001s02.dat
// 0 Author: Rene Rechthaler [Blechtaler]
// 0 !LDRAW_ORG Subpart UPDATE 2024-09
// 0 !LICENSE Licensed under CC BY 4.0 : see CAreadme.txt
// 
// 0 BFC CERTIFY CCW
  [0,"BFC","CERTIFY"],
  [0,"BFC","CCW"],
// 
// 0 !HISTORY 2023-11-20 [Blechtaler] made from 3001s01
// 0 !HISTORY 2024-10-27 [OrionP] Official Update 2024-09
// 
// 1 16 20 4 0 1 0 0 0 -5 0 0 0 1 stud4.dat
  [1,16,20,4,0,1,0,0,0,-5,0,0,0,1, ldraw_lib__stud4()],
// 1 16 0 4 0 1 0 0 0 -5 0 0 0 1 stud4.dat
  [1,16,0,4,0,1,0,0,0,-5,0,0,0,1, ldraw_lib__stud4()],
// 1 16 -20 4 0 1 0 0 0 -5 0 0 0 1 stud4.dat
  [1,16,-20,4,0,1,0,0,0,-5,0,0,0,1, ldraw_lib__stud4()],
// 0 BFC INVERTNEXT
  [0,"BFC","INVERTNEXT"],
// 1 16 0 24 0 36 0 0 0 -20 0 0 0 16 box5.dat
  [1,16,0,24,0,36,0,0,0,-20,0,0,0,16, ldraw_lib__box5()],
// 4 16 40 24 20 36 24 16 -36 24 16 -40 24 20
  [4,16,40,24,20,36,24,16,-36,24,16,-40,24,20],
// 4 16 -40 24 20 -36 24 16 -36 24 -16 -40 24 -20
  [4,16,-40,24,20,-36,24,16,-36,24,-16,-40,24,-20],
// 4 16 -40 24 -20 -36 24 -16 36 24 -16 40 24 -20
  [4,16,-40,24,-20,-36,24,-16,36,24,-16,40,24,-20],
// 4 16 40 24 -20 36 24 -16 36 24 16 40 24 20
  [4,16,40,24,-20,36,24,-16,36,24,16,40,24,20],
// 1 16 0 24 0 0 0 40 0 -24 0 -20 0 0 box4.dat
  [1,16,0,24,0,0,0,40,0,-24,0,-20,0,0, ldraw_lib__box4()],
];
module ldraw_lib__s__3001s02(step=0, col=false, unit=2/5, alt=false, line=0.2, solid=!$preview)
    makepoly(ldraw_lib__s__3001s02(), step=step, col=col, unit=unit, alt=alt, line=line, solid=solid);
ldraw_lib__s__3001s02(line=0.2);
// main file
use <../lib.scad>
use <s/3001s02.scad>
use <../p/stud.scad>
function ldraw_lib__65551() = [
// 0 Brick Braille 2 x 4 with 1 Stud (DOTS-3)
// 0 Name: 65551.dat
// 0 Author: Chris Böhnke [KnightOfTarenta]
// 0 !LDRAW_ORG Part UPDATE 2025-08
// 0 !LICENSE Licensed under CC BY 4.0 : see CAreadme.txt
// 
// 0 BFC CERTIFY CCW
  [0,"BFC","CERTIFY"],
  [0,"BFC","CCW"],
// 
// 0 !HISTORY 2025-08-26 [KnightOfTarenta] Modified from 65551p01.dat by Rene Rechthaler [Blechtaler]
// 0 !HISTORY 2025-08-31 [OrionP] Official Update 2025-08
// 
// 1 16 0 0 0 1 0 0 0 1 0 0 0 1 s\3001s02.dat
  [1,16,0,0,0,1,0,0,0,1,0,0,0,1, ldraw_lib__s__3001s02()],
// 1 16 10 0 -10 1 0 0 0 1 0 0 0 1 stud.dat
  [1,16,10,0,-10,1,0,0,0,1,0,0,0,1, ldraw_lib__stud()],
// 
// 0 // Pattern
// 4 16 40 0 20 -40 0 20 -40 0 -20 40 0 -20
  [4,16,40,0,20,-40,0,20,-40,0,-20,40,0,-20],
];
module ldraw_lib__65551(step=0, col=false, unit=2/5, alt=false, line=0.2, solid=!$preview)
    makepoly(ldraw_lib__65551(), step=step, col=col, unit=unit, alt=alt, line=line, solid=solid);
ldraw_lib__65551(line=0.2);
